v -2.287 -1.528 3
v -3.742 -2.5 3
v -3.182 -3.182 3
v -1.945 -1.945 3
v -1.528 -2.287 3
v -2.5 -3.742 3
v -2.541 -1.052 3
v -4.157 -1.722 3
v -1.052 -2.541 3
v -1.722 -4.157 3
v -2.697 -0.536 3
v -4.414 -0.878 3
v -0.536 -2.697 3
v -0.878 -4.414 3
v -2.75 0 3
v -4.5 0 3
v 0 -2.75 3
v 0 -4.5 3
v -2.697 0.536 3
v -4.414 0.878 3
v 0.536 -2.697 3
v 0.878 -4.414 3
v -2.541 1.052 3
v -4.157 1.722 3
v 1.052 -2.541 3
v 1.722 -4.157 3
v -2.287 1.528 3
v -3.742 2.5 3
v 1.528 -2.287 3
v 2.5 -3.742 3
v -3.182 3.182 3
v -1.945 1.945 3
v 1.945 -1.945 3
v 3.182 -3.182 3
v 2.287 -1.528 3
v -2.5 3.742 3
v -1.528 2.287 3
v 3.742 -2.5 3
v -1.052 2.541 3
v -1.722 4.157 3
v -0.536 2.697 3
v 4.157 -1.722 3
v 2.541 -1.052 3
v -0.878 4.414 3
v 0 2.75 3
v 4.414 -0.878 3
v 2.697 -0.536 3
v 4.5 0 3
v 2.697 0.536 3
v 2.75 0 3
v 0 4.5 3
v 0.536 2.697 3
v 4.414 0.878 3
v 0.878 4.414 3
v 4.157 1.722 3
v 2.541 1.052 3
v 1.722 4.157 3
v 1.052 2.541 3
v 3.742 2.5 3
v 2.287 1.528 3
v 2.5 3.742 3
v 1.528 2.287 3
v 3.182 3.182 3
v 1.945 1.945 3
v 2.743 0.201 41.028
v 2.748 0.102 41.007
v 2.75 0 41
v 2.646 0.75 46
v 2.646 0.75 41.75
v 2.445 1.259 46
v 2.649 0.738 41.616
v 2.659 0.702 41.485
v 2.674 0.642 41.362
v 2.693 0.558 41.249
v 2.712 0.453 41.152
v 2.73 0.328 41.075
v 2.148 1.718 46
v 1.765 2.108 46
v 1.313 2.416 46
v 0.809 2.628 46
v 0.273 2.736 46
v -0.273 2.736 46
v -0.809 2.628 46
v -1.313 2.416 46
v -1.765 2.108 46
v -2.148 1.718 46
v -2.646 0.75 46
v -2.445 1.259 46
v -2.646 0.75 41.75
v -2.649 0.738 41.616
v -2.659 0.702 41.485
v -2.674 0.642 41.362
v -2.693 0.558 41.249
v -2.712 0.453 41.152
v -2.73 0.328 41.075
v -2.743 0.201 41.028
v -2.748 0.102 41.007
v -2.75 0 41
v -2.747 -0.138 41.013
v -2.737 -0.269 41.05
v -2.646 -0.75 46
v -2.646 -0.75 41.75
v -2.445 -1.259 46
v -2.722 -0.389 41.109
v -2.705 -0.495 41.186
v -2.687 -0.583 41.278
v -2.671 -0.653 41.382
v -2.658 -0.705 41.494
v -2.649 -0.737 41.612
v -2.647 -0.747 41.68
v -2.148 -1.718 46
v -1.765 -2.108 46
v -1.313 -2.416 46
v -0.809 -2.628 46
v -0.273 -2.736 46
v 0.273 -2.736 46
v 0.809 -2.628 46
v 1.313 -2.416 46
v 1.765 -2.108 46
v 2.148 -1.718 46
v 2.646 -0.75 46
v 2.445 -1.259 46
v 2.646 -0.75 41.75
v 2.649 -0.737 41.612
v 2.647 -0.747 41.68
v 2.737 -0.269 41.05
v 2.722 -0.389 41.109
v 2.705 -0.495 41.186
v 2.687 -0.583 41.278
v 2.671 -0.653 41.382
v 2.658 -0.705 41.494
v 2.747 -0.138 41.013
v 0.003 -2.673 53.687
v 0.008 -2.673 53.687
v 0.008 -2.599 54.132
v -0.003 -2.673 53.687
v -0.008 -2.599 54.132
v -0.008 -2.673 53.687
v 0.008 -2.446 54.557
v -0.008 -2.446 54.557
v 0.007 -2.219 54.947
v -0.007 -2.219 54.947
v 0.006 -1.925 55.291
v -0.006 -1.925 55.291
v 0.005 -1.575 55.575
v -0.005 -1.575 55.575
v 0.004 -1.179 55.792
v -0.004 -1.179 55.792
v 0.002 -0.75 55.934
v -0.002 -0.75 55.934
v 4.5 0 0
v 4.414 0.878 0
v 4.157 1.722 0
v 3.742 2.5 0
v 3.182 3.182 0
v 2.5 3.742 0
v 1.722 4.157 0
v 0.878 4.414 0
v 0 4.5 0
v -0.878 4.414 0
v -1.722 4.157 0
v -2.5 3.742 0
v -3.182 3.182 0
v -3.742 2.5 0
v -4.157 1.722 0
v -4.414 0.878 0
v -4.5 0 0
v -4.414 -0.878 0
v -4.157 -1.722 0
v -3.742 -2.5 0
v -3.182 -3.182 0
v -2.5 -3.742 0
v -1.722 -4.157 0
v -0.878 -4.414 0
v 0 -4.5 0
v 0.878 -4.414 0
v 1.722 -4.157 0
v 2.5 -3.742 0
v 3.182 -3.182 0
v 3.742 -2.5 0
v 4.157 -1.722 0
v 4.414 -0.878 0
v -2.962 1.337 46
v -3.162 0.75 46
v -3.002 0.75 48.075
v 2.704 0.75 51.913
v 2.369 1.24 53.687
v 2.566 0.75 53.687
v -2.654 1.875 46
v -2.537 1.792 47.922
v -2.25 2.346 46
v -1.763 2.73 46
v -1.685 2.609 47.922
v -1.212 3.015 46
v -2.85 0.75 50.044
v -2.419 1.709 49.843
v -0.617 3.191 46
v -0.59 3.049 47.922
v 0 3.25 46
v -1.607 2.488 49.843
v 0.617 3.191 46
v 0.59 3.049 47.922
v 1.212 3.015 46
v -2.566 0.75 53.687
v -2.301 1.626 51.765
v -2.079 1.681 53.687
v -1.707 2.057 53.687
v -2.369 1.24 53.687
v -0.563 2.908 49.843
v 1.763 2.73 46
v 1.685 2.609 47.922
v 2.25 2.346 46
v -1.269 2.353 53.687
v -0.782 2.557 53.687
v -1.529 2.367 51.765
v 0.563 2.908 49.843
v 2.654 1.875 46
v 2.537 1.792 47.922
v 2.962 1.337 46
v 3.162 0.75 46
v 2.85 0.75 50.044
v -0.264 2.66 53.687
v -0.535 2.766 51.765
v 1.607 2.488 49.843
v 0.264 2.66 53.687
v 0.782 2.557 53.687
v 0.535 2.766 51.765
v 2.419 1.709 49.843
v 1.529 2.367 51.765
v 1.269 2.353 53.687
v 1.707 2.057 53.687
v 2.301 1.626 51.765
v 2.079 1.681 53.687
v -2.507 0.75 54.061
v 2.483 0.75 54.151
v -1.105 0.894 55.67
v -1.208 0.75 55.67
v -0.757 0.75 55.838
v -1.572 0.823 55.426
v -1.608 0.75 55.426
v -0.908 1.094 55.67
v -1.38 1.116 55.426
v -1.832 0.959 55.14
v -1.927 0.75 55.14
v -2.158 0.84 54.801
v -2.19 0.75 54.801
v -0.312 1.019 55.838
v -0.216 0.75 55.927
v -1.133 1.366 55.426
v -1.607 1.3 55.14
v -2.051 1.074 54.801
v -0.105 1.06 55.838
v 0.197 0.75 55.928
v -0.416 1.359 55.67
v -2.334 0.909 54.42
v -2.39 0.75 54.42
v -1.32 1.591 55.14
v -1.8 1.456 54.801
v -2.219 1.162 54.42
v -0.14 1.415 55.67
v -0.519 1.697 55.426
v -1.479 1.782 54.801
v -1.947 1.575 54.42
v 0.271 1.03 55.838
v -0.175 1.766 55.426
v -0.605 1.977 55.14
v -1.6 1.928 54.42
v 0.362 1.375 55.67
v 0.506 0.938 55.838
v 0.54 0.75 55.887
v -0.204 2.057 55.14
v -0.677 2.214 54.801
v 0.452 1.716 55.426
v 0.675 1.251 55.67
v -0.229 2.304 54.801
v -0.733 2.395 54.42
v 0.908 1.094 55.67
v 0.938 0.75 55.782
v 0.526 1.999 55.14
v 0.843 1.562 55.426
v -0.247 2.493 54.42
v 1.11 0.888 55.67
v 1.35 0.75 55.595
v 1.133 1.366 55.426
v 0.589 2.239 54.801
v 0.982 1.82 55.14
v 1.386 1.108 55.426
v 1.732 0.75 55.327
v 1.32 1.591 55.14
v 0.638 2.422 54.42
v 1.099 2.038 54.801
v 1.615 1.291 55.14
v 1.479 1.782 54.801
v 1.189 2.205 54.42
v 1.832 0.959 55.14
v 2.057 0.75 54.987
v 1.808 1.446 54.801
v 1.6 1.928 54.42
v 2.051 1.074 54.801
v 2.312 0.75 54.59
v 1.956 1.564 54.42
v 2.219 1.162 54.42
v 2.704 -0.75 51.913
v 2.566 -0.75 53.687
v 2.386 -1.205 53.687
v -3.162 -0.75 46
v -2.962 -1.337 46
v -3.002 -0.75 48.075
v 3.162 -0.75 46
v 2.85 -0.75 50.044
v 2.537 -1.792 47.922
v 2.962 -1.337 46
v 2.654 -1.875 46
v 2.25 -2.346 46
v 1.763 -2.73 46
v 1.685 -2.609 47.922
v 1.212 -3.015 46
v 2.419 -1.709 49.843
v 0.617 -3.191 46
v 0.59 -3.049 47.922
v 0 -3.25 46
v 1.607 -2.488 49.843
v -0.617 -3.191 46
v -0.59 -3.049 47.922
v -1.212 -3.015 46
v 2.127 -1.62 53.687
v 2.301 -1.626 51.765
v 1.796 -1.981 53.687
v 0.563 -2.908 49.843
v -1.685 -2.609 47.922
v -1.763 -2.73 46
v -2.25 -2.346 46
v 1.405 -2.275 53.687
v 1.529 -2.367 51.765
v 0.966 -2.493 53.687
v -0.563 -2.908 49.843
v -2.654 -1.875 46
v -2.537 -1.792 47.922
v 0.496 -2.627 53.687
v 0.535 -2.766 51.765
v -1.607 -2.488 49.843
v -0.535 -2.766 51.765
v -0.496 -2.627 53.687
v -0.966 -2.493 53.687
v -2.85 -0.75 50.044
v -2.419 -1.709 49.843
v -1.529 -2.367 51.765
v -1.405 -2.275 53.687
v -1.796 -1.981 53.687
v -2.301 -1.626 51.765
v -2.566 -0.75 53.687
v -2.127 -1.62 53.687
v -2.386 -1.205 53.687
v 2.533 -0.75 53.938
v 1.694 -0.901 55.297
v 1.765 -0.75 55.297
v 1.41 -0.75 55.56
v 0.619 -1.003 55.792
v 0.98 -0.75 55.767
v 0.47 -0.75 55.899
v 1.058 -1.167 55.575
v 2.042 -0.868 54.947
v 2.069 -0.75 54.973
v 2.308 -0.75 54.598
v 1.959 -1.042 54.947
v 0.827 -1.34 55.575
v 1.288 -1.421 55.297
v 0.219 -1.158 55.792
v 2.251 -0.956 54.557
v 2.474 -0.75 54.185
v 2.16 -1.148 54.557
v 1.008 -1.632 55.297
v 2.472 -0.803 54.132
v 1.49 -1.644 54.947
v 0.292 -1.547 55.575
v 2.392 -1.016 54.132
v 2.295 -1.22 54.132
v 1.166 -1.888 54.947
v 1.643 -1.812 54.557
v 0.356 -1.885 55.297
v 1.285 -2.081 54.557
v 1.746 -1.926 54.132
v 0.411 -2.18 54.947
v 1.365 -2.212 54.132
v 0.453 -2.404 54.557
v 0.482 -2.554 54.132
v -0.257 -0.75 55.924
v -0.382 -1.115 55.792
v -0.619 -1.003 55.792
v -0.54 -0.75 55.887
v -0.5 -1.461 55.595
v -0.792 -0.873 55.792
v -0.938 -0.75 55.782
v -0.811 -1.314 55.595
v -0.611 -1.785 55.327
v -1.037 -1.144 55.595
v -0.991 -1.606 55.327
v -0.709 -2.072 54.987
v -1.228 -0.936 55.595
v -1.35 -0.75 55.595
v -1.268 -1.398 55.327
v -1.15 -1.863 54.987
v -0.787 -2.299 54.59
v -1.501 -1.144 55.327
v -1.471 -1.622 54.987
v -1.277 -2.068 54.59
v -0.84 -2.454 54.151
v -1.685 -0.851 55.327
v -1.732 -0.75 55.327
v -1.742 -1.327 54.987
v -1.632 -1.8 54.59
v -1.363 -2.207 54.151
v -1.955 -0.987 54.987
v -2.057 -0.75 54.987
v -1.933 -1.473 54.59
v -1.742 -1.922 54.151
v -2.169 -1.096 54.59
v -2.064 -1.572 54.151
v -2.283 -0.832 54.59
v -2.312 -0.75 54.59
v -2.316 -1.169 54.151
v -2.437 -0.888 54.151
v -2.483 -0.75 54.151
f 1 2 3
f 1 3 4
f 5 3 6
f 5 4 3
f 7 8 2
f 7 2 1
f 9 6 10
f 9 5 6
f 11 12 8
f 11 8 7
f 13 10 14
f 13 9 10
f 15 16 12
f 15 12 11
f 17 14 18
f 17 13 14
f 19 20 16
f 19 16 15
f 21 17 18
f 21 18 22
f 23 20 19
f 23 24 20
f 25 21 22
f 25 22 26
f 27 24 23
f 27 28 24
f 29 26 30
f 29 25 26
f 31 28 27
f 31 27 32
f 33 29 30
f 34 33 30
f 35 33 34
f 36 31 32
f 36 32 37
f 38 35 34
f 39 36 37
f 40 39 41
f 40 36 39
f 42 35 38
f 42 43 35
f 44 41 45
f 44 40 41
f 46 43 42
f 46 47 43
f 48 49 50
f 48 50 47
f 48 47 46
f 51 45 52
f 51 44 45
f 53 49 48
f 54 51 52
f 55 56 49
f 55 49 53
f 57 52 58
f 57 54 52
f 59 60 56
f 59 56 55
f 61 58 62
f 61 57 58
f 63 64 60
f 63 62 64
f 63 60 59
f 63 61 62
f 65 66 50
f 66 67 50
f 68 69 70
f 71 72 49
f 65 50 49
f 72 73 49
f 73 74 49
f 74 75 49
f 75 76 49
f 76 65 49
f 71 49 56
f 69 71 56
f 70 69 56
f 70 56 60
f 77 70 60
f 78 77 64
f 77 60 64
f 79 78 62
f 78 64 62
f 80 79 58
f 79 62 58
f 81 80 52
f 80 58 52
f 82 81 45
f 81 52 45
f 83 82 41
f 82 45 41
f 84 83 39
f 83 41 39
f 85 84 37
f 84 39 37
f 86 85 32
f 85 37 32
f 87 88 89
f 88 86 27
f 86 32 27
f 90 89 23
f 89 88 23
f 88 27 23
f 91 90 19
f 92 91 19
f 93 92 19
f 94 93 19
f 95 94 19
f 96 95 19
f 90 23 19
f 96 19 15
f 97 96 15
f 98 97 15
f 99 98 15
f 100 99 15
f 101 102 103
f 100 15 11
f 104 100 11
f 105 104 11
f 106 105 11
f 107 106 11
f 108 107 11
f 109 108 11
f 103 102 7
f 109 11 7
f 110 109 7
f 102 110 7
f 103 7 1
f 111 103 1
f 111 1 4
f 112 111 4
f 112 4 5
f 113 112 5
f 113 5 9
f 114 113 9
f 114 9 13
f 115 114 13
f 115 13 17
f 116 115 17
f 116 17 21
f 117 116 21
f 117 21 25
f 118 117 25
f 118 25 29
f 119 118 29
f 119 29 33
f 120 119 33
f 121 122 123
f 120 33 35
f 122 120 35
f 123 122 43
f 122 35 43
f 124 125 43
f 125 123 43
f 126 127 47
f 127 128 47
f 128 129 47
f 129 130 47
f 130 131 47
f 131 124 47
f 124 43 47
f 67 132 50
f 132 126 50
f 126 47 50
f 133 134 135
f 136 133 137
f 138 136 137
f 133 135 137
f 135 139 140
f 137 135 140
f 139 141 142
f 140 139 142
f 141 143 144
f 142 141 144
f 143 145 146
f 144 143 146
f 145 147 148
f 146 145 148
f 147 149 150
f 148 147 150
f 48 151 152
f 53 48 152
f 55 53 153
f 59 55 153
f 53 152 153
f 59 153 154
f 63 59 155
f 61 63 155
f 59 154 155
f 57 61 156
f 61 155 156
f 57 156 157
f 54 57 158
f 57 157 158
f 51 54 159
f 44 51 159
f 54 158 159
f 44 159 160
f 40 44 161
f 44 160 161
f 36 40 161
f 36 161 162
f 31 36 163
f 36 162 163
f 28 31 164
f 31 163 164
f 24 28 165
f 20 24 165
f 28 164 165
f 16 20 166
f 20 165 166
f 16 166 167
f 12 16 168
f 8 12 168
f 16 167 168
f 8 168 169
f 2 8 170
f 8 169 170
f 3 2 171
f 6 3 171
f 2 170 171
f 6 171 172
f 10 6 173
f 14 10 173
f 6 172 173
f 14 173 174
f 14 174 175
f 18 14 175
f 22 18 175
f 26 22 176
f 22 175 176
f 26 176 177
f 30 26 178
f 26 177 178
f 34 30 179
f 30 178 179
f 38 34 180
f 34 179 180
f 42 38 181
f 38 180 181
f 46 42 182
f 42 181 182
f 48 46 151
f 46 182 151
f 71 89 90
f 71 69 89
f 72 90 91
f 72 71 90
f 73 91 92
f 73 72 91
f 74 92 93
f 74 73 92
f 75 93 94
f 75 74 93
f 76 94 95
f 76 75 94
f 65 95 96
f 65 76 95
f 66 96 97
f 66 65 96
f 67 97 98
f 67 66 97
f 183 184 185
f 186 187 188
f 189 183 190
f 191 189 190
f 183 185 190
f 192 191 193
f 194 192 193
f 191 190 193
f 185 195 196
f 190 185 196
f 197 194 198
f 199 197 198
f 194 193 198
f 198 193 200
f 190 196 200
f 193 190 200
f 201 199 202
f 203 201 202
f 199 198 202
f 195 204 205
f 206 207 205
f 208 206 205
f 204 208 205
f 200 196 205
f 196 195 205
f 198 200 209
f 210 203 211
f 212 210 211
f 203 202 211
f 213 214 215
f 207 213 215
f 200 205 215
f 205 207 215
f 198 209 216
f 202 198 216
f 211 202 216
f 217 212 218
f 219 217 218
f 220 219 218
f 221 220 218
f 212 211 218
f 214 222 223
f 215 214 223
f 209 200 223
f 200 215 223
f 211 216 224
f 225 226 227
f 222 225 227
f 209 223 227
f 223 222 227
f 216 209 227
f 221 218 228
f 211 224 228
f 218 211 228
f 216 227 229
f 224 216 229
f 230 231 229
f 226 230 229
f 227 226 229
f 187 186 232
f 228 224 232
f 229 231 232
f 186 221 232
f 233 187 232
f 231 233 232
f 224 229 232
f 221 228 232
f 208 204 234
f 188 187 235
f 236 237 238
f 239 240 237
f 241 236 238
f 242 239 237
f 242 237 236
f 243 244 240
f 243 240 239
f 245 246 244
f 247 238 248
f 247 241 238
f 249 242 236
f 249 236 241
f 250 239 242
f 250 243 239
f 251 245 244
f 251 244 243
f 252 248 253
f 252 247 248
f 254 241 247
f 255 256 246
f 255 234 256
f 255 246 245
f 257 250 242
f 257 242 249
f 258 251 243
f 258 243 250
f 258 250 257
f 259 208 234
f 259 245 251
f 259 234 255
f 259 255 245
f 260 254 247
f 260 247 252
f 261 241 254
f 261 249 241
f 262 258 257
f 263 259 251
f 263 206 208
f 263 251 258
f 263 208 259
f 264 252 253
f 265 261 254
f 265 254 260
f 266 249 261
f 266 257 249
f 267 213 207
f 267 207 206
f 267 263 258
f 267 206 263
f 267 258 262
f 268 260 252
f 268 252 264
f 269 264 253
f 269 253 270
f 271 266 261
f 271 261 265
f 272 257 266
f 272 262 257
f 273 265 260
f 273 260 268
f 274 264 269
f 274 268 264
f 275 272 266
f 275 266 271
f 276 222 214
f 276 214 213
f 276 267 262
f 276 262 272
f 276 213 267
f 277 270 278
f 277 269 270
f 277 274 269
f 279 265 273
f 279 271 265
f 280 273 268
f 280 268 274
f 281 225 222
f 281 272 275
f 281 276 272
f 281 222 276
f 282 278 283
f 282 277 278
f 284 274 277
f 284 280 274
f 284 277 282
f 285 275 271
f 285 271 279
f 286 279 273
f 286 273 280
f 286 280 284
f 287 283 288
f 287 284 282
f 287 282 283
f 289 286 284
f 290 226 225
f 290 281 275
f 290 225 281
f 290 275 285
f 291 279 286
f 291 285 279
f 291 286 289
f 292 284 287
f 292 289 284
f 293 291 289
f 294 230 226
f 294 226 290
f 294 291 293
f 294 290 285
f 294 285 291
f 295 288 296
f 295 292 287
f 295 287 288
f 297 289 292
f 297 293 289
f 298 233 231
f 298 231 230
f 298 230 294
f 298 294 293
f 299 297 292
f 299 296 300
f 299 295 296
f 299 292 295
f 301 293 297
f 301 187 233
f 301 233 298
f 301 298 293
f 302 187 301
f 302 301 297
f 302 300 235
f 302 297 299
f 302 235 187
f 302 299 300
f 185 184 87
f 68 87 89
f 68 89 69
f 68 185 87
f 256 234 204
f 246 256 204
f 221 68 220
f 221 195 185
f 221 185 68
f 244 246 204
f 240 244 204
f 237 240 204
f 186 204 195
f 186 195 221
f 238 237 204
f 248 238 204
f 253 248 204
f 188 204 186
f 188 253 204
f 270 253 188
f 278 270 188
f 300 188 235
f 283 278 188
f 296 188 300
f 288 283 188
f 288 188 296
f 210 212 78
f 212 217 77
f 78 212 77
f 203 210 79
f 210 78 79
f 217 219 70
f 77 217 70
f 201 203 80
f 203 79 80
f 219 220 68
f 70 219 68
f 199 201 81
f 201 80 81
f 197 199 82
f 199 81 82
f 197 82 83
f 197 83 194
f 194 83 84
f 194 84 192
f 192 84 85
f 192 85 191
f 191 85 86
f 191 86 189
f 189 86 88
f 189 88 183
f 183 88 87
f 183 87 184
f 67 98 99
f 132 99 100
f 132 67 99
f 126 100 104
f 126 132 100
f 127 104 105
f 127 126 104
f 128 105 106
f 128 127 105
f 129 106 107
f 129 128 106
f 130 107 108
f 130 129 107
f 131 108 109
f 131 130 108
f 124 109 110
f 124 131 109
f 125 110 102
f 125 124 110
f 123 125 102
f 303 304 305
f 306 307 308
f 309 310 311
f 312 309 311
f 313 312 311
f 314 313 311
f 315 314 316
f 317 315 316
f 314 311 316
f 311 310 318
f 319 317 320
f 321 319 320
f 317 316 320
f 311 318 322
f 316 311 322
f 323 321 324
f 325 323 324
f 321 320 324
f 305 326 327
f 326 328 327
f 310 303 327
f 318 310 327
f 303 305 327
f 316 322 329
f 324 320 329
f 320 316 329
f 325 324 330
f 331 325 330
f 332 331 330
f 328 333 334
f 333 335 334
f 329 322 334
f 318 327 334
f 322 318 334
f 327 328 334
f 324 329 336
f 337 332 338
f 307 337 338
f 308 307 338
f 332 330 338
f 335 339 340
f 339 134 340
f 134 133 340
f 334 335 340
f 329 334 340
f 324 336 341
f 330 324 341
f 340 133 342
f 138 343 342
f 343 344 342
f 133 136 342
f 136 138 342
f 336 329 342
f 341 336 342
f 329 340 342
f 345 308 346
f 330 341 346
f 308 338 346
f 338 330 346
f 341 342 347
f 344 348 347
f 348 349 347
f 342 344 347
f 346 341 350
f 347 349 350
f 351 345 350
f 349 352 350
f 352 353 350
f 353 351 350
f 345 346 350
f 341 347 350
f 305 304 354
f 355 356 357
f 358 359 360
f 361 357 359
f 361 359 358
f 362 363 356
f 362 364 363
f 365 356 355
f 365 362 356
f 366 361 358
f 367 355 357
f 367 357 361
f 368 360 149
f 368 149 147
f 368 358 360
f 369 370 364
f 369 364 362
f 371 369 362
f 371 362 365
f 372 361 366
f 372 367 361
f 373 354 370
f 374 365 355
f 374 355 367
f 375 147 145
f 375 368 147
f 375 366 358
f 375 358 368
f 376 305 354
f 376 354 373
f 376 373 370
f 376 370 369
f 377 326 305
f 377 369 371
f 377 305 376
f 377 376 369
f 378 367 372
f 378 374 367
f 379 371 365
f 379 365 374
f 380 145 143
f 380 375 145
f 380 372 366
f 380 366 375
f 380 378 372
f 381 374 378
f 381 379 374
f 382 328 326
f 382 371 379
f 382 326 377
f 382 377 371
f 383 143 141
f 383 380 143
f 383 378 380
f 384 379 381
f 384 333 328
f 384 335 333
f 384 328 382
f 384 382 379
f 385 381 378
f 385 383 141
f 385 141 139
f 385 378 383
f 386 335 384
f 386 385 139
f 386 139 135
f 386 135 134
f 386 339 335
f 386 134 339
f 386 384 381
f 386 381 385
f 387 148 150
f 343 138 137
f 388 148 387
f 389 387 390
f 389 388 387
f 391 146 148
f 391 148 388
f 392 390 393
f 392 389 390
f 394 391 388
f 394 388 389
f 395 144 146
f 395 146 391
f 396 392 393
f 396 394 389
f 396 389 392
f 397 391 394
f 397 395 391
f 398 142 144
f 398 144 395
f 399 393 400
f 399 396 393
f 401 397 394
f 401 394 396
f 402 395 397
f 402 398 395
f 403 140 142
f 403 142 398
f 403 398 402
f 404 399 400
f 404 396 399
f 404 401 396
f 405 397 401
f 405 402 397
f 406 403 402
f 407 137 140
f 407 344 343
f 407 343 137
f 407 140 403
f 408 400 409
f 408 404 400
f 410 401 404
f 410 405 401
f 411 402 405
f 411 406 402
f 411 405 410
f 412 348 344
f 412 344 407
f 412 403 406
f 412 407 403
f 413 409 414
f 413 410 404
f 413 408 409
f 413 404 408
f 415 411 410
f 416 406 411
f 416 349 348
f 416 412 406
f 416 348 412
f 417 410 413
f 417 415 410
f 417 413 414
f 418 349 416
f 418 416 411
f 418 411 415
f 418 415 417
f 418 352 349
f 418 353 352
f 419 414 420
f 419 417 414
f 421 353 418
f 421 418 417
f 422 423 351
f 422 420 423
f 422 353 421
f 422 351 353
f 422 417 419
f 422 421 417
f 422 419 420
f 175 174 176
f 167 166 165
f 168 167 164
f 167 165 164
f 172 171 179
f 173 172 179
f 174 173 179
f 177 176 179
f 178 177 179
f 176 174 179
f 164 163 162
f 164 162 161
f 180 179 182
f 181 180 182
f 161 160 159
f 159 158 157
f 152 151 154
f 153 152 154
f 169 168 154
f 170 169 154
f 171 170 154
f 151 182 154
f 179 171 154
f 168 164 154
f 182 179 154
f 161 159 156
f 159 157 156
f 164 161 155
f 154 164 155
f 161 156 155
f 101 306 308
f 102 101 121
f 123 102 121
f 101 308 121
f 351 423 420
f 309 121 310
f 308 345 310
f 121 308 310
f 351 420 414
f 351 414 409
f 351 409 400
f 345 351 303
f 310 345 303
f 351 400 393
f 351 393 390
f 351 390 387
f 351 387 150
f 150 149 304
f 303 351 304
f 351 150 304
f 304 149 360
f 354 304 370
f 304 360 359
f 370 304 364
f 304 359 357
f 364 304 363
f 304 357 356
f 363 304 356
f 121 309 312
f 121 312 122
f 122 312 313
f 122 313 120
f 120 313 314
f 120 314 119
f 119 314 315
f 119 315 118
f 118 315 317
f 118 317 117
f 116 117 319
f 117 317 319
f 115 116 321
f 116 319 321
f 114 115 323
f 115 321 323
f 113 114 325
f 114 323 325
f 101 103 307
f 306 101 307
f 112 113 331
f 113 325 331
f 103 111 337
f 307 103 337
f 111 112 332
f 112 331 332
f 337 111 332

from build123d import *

# Parameters (mm, degrees)
F0_R        = 4.5
F1_DEPTH    = 3
F2_R        = 2.75
F3_DEPTH    = 43
F6_W        = 10
F6_H        = 1.5
F7_DEPTH    = 15
F8_T2_ANGLE = 359.64
F8_T4_ANGLE = 359.64
F9_R        = 0.7499


# Not quite as in the source:
# - a fillet or chamfer that OpenCascade refuses, or shapes differently, is made with other operations: its cross-section is extruded or revolved along the edge and cut away or added
# - a fillet or chamfer is up to 0.001 mm smaller than in the source, because OpenCascade refuses the exact size


with BuildPart() as f1:
    # F0 (on Top) → F1 (new body)
    with BuildSketch(Plane.XY):
        Circle(F0_R)
    extrude(amount=F1_DEPTH)

    # F2 (on face) → F3 (join)
    with BuildSketch(Plane.XY.offset(3)):
        Circle(F2_R)
    extrude(amount=F3_DEPTH)

    # F4 (on Front) → F5 (revolve)
    with BuildSketch(Plane.XZ):
        Polygon((0, 56), (0, 46), (3.25, 46), (2.5, 56), align=None)
    revolve(axis=Axis((0, 0, 51), (0, 0, -1)))

    # F6 (on face) → F7 (cut)
    with BuildSketch(Plane.XY.offset(56)):
        Rectangle(F6_W, F6_H)
    extrude(amount=-F7_DEPTH, mode=Mode.SUBTRACT)

    # F8: fillet of radius 2.5 on 2 edges, made by hand

    # F8_s1 → F8_t2 (revolve, cut)
    with BuildSketch(Plane(origin=(0, 0, 0), x_dir=(0, 0, 1), z_dir=(0.9999950652, -0.0031415875, 0))):
        with BuildLine():
            ThreePointArc((56, 0.18047861), (55.3326807109, 1.880855454), (53.6869748706, 2.6734768847))
            Line((53.6869748706, 2.6734768847), (56, 2.5))
            Line((56, 2.5), (56, 0.18047861))
        make_face()
    revolve(axis=Axis((0, 0, 56), (0, 0, -1)), revolution_arc=F8_T2_ANGLE, mode=Mode.SUBTRACT)

    # F8_s3 → F8_t4 (revolve, cut)
    with BuildSketch(Plane(origin=(0, 0, 0), x_dir=(0, 0, 1), z_dir=(-0.9999950652, 0.0031415875, 0))):
        with BuildLine():
            ThreePointArc((53.6869748706, 2.6734768847), (55.3326807109, 1.880855454), (56, 0.18047861))
            Line((56, 0.18047861), (56, 2.5))
            Line((56, 2.5), (53.6869748706, 2.6734768847))
        make_face()
    revolve(axis=Axis((0, 0, 56), (0, 0, -1)), revolution_arc=F8_T4_ANGLE, mode=Mode.SUBTRACT)

    # F9 (radius 0.75 in the source; OpenCascade refuses exactly that, so slightly less here)
    f9_edges = [f1.edges().sort_by_distance(p)[0] for p in [
        (0, 0.75, 41),
        (0, -0.75, 41),
    ]]
    fillet(f9_edges, radius=F9_R)


solid = f1.part
